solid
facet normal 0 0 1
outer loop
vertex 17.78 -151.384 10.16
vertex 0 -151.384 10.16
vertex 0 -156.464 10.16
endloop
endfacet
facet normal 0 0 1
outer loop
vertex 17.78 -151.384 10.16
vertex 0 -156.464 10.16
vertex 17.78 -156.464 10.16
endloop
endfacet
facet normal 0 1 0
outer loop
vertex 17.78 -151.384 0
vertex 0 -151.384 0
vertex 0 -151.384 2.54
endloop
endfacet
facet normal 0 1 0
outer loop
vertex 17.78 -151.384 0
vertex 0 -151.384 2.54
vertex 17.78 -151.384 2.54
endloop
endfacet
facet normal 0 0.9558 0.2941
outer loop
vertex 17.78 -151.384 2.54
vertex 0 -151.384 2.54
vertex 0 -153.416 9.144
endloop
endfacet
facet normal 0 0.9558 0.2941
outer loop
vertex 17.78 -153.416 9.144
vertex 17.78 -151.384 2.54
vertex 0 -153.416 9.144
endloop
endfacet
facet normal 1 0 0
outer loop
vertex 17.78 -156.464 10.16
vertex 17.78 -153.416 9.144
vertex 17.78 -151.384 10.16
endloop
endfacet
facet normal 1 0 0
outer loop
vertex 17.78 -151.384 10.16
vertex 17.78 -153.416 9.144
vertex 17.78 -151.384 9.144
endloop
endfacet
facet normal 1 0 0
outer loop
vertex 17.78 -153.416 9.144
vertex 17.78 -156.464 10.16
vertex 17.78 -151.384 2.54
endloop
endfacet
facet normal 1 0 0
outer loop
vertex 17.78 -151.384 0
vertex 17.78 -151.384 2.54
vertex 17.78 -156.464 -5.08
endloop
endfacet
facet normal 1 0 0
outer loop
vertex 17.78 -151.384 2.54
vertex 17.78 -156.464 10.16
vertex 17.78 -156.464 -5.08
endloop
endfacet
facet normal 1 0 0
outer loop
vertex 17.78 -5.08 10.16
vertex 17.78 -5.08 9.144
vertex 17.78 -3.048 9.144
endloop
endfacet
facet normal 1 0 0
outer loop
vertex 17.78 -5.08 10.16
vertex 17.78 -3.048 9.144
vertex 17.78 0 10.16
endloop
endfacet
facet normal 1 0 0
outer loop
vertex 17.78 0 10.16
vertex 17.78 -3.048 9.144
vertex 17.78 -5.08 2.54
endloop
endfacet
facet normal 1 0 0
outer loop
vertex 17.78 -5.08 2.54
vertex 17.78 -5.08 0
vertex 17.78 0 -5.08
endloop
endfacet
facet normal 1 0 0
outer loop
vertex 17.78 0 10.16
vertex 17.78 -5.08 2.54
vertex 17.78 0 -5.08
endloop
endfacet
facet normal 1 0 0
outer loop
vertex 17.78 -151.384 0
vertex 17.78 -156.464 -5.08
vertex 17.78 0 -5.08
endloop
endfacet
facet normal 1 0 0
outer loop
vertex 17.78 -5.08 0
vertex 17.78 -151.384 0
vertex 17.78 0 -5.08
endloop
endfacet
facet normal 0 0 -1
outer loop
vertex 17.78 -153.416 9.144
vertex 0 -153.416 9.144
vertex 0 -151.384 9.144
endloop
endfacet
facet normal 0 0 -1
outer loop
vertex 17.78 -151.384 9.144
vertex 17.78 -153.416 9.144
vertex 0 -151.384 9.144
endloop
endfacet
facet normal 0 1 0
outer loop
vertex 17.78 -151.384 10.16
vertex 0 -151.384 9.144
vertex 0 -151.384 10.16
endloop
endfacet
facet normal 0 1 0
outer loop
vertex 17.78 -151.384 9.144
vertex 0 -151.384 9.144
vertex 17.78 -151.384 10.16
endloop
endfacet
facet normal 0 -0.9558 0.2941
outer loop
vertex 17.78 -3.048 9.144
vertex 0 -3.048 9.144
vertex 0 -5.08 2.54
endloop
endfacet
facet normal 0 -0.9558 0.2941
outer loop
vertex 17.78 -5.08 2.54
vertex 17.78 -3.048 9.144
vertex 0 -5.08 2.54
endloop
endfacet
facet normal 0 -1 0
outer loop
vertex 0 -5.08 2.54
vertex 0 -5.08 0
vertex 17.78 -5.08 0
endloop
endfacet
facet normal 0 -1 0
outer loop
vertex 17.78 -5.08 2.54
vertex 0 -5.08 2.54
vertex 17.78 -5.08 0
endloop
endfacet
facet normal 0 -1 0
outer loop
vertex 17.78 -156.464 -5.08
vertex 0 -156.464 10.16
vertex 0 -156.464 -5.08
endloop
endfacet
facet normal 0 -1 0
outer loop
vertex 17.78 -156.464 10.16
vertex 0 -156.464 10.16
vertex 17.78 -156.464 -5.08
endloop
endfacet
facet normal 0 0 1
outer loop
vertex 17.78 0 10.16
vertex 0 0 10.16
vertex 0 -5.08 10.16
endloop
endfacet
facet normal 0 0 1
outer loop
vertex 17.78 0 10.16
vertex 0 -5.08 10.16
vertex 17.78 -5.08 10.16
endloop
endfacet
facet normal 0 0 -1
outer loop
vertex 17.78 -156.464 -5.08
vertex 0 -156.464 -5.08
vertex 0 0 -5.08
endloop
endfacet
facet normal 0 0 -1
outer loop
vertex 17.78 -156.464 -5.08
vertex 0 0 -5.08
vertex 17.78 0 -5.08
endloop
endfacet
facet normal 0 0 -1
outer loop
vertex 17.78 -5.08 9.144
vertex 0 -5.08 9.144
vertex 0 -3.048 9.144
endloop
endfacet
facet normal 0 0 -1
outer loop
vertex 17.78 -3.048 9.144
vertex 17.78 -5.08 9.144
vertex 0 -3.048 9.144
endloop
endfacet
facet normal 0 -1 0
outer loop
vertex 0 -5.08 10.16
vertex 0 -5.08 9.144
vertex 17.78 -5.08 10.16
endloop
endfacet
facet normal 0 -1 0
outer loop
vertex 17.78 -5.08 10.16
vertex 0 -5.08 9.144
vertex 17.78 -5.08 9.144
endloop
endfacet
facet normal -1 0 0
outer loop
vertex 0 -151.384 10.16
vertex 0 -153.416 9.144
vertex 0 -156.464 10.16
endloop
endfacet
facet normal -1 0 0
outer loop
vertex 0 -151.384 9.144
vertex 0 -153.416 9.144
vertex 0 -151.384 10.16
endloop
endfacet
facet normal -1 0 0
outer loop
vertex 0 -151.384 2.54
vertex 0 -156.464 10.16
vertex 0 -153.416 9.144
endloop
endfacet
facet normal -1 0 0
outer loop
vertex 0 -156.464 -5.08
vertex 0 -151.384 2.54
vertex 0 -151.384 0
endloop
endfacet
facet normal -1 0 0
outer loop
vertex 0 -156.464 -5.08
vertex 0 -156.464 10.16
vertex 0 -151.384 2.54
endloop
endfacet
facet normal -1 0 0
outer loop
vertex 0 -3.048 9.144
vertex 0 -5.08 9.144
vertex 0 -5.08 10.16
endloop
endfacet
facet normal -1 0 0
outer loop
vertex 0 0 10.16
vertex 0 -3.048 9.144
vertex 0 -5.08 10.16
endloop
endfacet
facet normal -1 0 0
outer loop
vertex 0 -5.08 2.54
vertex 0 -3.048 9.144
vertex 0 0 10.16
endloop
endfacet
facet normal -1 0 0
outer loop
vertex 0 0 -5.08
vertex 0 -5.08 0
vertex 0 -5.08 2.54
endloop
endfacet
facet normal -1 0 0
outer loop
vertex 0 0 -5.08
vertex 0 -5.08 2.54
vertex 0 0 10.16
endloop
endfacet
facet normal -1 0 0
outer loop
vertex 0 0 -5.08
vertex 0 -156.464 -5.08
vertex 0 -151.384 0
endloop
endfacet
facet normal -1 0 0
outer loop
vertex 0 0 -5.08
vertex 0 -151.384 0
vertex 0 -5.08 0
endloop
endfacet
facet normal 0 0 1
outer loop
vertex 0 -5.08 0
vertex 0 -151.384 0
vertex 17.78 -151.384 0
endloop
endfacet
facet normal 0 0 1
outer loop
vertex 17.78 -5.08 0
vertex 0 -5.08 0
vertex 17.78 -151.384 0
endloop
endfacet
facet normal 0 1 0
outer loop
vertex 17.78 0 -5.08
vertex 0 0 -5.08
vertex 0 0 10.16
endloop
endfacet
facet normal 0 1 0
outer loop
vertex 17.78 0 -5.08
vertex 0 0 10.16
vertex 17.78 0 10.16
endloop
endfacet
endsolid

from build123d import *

# Parameters (mm, degrees)
F0_W     = 17.78
F0_H     = 73.152
F0_H_2   = 5.08
F1_DEPTH = 5.08
F2_DEPTH = 10.16
F4_DEPTH = 25.4


# Not quite as in the source:
# - a feature names something its author has since deleted; it is built from what else it names


with BuildPart() as f1:
    # F0 (on Top) → F1 (new body)
    with BuildSketch(Plane.XY):
        with Locations((8.89, -41.656)):
            Rectangle(F0_W, F0_H)
        with Locations((8.89, -2.54)):
            Rectangle(F0_W, F0_H_2)
        with Locations((8.89, -114.808)):
            Rectangle(F0_W, F0_H)
        with Locations((8.89, -153.924)):
            Rectangle(F0_W, F0_H_2)
    extrude(amount=-F1_DEPTH)

    # F0 (on Top) → F2 (join)
    with BuildSketch(Plane.XY):
        with Locations((8.89, -2.54)):
            Rectangle(F0_W, F0_H_2)
        with Locations((8.89, -153.924)):
            Rectangle(F0_W, F0_H_2)
    extrude(amount=F2_DEPTH)

    # F3 (on face) → F4 (cut)
    with BuildSketch(Plane(origin=(0, 0, 0), x_dir=(0, -1, 0), z_dir=(-1, 0, 0))):
        Polygon((3.048, 9.144), (5.08, 2.54), (5.08, 9.144), align=None)
        Polygon((151.384, 9.144), (151.384, 2.54), (153.416, 9.144), align=None)
    extrude(amount=-F4_DEPTH, mode=Mode.SUBTRACT)


solid = f1.part
